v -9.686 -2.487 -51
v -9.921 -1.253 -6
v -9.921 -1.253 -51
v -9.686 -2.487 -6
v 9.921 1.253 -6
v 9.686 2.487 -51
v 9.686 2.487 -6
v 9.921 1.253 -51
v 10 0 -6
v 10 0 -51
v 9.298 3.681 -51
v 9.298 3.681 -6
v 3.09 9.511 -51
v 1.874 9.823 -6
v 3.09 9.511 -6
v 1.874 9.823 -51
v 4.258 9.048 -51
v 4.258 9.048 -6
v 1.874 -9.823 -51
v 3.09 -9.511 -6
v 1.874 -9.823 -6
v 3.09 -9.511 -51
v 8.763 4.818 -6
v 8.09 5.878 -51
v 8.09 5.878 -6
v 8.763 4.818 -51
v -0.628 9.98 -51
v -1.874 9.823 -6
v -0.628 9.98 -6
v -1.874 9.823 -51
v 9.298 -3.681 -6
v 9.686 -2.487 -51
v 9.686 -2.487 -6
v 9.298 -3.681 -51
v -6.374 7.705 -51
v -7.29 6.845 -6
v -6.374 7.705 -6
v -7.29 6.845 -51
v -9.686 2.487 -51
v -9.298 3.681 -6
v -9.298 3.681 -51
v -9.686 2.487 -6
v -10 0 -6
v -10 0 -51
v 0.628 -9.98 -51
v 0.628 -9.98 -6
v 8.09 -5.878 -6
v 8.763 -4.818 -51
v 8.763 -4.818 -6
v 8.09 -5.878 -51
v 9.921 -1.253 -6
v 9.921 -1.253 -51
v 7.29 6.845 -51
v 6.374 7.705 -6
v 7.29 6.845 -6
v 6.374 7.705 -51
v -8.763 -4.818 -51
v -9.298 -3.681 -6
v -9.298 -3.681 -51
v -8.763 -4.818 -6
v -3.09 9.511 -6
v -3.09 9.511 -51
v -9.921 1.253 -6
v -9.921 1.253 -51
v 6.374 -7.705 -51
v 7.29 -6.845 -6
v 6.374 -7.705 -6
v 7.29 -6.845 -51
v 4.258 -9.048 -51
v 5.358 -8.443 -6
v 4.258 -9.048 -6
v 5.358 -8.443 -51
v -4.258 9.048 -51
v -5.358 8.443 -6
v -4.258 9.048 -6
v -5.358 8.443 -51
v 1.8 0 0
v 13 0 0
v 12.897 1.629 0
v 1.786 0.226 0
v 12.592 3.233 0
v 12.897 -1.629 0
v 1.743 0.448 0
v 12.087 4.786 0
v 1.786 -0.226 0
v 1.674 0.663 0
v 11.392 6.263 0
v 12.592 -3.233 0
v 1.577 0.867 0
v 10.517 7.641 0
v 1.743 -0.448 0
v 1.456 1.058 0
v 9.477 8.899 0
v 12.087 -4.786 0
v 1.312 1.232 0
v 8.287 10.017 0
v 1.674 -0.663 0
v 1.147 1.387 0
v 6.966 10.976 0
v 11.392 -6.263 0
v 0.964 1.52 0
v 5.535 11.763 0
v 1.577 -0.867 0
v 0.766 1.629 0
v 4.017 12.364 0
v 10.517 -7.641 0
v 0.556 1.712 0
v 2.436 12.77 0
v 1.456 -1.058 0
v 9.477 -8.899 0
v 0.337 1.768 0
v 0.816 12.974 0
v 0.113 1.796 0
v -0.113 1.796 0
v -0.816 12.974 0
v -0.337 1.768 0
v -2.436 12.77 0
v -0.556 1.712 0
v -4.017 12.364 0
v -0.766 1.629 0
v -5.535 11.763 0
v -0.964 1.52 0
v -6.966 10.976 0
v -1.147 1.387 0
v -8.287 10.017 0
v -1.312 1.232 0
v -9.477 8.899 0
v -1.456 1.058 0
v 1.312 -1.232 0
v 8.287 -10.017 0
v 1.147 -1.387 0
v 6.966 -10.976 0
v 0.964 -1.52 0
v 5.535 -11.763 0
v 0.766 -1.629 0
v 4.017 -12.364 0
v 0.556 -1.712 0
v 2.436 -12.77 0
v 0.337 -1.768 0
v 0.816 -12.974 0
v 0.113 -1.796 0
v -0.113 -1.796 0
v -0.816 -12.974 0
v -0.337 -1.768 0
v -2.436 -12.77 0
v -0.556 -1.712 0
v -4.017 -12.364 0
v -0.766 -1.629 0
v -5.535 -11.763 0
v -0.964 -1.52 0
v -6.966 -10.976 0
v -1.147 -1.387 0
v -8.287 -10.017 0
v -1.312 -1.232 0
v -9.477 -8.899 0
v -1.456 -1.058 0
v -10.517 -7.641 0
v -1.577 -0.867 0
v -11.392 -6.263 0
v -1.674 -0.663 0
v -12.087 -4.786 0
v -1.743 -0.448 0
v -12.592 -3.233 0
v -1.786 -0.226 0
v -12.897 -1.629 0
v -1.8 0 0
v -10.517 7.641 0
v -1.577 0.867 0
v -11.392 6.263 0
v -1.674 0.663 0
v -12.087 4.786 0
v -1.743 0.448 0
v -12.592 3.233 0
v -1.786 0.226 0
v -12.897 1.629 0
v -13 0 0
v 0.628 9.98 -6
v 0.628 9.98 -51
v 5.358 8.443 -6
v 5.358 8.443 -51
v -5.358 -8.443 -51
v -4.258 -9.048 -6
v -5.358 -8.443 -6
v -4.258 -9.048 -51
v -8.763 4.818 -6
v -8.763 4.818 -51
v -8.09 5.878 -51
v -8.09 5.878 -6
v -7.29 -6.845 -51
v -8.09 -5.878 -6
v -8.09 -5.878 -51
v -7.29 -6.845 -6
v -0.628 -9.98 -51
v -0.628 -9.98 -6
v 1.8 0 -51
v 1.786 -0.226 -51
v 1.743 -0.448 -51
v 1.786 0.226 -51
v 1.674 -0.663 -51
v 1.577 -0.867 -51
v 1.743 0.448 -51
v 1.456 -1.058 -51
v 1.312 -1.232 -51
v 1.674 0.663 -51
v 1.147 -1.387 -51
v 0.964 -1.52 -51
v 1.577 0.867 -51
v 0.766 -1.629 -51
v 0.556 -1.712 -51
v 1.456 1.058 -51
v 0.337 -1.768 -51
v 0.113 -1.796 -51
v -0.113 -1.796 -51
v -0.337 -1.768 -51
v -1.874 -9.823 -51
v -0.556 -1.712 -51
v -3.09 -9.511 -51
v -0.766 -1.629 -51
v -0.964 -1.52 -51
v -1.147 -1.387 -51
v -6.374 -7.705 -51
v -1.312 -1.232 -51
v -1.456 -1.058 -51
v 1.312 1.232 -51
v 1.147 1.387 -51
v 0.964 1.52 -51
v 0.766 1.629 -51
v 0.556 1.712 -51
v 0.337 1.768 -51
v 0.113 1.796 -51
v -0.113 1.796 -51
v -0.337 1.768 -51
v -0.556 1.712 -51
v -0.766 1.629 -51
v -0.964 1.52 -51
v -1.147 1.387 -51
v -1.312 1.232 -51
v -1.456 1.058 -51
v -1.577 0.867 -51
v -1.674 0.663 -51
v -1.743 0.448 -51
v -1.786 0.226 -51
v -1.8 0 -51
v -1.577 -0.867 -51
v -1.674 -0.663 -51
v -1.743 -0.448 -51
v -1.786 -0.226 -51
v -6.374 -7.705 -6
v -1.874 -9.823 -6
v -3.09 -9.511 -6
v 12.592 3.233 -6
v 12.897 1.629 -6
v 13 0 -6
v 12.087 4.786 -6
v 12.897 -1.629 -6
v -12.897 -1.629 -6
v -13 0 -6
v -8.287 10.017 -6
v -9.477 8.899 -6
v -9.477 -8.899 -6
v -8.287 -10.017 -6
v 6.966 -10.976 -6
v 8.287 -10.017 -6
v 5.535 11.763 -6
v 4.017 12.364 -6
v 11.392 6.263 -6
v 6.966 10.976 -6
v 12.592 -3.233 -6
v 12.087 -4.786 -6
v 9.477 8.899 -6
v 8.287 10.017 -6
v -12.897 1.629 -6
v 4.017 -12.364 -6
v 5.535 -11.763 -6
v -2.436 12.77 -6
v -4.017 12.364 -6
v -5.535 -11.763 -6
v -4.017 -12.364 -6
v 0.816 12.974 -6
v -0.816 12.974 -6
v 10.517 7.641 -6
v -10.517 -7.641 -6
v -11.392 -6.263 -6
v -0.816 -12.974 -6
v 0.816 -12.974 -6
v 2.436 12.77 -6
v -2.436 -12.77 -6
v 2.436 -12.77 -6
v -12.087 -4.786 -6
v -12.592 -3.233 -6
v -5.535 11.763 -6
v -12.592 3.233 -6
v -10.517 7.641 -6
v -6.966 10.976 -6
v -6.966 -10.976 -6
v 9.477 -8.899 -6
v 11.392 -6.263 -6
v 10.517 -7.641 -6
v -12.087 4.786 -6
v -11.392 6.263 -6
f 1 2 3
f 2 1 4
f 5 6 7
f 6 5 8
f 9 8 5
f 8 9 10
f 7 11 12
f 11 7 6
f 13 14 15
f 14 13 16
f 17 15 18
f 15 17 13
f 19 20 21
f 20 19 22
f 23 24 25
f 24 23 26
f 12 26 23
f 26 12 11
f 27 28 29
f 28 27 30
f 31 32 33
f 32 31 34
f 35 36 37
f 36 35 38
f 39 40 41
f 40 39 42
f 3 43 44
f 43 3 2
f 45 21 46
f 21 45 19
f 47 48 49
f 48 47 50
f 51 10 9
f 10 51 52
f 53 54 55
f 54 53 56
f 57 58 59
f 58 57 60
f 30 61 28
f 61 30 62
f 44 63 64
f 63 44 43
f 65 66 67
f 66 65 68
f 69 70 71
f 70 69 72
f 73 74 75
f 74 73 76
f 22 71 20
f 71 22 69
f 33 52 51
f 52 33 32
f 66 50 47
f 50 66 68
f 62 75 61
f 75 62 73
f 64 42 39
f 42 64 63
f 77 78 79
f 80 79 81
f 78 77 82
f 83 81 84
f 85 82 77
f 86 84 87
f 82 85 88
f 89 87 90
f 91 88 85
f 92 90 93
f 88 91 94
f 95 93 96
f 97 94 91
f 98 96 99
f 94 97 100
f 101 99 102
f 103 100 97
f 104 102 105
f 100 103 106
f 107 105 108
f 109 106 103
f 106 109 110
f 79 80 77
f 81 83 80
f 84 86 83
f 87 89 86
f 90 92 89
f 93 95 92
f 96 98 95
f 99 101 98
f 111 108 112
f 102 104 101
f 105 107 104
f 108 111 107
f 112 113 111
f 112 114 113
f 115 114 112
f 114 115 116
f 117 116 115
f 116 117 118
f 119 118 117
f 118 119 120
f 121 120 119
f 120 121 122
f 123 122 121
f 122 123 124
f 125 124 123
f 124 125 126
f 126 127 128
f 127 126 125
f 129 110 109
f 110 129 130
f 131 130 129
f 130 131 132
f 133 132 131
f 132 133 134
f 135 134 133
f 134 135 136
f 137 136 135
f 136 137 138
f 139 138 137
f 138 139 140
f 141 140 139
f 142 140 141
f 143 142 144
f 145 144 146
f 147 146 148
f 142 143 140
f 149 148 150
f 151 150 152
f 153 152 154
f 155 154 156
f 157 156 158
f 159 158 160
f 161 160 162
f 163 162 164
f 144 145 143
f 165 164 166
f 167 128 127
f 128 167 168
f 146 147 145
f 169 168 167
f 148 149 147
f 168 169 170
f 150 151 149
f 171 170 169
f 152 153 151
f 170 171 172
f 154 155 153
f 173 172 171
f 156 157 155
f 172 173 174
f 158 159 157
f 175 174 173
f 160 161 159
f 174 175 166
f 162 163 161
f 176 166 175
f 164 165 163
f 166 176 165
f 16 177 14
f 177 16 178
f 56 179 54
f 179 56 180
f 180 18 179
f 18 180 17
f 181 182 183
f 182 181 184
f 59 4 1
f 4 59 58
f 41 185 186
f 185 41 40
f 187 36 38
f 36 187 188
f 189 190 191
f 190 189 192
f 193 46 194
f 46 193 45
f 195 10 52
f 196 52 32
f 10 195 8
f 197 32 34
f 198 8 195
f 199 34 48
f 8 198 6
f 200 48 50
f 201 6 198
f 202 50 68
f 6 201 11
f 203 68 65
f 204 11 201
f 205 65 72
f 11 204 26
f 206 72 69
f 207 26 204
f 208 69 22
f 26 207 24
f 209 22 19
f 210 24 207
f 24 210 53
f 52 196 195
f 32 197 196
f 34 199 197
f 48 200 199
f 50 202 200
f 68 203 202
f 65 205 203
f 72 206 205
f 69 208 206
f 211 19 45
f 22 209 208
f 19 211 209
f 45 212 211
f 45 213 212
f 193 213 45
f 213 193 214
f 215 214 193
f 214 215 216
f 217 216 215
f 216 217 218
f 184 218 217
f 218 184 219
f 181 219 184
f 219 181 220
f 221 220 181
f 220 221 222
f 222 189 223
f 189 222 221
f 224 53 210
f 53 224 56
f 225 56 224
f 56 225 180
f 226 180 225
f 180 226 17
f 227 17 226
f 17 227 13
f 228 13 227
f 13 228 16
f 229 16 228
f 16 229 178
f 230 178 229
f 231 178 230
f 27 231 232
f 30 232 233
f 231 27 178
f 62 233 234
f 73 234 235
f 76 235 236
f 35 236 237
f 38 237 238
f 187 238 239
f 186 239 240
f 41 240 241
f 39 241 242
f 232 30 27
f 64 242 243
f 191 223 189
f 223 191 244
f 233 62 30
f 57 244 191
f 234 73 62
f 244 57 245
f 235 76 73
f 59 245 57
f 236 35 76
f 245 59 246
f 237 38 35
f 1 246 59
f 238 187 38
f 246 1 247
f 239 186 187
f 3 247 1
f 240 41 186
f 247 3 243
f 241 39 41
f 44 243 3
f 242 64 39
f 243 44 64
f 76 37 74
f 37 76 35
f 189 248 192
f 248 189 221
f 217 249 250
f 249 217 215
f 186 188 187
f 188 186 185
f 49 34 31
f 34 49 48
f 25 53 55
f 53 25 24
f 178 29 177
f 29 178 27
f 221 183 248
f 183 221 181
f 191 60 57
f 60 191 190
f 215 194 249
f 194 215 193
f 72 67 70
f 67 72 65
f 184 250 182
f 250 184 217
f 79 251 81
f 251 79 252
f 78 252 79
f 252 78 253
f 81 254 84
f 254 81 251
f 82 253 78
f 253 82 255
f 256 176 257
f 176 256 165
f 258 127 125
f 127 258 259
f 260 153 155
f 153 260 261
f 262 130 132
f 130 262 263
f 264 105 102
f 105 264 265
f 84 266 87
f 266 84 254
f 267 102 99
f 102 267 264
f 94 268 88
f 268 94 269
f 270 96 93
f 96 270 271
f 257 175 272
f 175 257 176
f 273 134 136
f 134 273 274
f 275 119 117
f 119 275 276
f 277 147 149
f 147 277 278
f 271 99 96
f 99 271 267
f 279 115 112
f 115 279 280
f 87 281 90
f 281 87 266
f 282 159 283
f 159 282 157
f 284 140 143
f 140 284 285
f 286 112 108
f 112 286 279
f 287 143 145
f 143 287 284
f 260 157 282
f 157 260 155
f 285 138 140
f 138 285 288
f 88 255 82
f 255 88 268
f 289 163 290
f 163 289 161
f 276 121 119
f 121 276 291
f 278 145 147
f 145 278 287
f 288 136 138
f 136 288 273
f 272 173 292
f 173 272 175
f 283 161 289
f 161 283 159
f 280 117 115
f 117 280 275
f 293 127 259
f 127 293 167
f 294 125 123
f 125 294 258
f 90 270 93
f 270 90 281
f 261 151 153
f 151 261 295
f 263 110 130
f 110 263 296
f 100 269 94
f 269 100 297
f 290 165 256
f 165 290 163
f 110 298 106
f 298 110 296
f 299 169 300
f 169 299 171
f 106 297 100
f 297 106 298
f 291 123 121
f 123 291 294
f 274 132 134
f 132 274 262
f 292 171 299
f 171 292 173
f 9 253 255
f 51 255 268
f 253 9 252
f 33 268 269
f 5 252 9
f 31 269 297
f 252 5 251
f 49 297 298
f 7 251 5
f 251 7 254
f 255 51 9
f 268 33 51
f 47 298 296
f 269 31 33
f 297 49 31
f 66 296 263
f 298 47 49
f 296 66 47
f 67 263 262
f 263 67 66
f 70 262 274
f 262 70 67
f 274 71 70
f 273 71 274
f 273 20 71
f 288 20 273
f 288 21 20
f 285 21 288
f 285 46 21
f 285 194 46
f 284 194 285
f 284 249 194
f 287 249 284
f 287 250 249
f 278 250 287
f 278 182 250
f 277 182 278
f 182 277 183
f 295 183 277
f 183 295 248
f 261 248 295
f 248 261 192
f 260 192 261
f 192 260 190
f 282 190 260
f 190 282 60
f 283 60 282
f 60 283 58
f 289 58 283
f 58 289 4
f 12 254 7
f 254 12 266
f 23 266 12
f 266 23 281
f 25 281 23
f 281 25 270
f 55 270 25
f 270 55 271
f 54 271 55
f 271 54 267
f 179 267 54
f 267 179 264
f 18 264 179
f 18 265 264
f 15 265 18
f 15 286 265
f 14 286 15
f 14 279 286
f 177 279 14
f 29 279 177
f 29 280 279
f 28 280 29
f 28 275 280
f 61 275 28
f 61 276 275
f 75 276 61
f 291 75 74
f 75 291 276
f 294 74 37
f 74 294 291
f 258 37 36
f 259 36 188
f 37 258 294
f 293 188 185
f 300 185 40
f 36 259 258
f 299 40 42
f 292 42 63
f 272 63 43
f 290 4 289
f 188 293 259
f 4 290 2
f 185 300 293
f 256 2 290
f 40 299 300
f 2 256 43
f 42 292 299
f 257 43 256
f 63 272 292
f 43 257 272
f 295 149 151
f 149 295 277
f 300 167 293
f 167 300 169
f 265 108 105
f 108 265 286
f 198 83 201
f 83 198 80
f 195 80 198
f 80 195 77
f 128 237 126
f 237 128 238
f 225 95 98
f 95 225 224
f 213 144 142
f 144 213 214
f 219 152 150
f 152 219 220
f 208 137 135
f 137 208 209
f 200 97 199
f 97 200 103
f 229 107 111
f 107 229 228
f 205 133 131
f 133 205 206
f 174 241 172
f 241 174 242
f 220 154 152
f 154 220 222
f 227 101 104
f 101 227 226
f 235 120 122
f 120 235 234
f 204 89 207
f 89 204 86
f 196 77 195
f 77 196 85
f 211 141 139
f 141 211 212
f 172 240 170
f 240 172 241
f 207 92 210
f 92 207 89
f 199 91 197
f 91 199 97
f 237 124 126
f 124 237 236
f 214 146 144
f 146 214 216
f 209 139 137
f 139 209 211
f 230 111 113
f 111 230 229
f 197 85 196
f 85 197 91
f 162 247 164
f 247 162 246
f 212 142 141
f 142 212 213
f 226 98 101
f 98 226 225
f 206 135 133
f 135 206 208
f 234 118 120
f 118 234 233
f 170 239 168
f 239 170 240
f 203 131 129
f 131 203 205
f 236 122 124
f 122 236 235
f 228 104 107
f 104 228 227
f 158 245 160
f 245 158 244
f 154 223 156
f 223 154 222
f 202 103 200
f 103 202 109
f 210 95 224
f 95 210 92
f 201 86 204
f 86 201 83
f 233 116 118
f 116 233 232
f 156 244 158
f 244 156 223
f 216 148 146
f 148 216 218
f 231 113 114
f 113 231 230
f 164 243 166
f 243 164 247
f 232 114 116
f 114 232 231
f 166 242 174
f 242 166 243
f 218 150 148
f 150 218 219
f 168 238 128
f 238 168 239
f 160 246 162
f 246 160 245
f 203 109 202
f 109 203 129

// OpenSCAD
$fn = 50;


difference() {
	union() {
		translate(v = [0, 0, -51.0000000000]) {
			cylinder(h = 51, r = 10.0000000000);
		}
		translate(v = [0, 0, -6.0000000000]) {
			cylinder(h = 6, r = 13.0000000000);
		}
	}
	union() {
		#translate(v = [0, 0, -51]) {
			cylinder(h = 51, r = 1.8000000000);
		}
	}
}
